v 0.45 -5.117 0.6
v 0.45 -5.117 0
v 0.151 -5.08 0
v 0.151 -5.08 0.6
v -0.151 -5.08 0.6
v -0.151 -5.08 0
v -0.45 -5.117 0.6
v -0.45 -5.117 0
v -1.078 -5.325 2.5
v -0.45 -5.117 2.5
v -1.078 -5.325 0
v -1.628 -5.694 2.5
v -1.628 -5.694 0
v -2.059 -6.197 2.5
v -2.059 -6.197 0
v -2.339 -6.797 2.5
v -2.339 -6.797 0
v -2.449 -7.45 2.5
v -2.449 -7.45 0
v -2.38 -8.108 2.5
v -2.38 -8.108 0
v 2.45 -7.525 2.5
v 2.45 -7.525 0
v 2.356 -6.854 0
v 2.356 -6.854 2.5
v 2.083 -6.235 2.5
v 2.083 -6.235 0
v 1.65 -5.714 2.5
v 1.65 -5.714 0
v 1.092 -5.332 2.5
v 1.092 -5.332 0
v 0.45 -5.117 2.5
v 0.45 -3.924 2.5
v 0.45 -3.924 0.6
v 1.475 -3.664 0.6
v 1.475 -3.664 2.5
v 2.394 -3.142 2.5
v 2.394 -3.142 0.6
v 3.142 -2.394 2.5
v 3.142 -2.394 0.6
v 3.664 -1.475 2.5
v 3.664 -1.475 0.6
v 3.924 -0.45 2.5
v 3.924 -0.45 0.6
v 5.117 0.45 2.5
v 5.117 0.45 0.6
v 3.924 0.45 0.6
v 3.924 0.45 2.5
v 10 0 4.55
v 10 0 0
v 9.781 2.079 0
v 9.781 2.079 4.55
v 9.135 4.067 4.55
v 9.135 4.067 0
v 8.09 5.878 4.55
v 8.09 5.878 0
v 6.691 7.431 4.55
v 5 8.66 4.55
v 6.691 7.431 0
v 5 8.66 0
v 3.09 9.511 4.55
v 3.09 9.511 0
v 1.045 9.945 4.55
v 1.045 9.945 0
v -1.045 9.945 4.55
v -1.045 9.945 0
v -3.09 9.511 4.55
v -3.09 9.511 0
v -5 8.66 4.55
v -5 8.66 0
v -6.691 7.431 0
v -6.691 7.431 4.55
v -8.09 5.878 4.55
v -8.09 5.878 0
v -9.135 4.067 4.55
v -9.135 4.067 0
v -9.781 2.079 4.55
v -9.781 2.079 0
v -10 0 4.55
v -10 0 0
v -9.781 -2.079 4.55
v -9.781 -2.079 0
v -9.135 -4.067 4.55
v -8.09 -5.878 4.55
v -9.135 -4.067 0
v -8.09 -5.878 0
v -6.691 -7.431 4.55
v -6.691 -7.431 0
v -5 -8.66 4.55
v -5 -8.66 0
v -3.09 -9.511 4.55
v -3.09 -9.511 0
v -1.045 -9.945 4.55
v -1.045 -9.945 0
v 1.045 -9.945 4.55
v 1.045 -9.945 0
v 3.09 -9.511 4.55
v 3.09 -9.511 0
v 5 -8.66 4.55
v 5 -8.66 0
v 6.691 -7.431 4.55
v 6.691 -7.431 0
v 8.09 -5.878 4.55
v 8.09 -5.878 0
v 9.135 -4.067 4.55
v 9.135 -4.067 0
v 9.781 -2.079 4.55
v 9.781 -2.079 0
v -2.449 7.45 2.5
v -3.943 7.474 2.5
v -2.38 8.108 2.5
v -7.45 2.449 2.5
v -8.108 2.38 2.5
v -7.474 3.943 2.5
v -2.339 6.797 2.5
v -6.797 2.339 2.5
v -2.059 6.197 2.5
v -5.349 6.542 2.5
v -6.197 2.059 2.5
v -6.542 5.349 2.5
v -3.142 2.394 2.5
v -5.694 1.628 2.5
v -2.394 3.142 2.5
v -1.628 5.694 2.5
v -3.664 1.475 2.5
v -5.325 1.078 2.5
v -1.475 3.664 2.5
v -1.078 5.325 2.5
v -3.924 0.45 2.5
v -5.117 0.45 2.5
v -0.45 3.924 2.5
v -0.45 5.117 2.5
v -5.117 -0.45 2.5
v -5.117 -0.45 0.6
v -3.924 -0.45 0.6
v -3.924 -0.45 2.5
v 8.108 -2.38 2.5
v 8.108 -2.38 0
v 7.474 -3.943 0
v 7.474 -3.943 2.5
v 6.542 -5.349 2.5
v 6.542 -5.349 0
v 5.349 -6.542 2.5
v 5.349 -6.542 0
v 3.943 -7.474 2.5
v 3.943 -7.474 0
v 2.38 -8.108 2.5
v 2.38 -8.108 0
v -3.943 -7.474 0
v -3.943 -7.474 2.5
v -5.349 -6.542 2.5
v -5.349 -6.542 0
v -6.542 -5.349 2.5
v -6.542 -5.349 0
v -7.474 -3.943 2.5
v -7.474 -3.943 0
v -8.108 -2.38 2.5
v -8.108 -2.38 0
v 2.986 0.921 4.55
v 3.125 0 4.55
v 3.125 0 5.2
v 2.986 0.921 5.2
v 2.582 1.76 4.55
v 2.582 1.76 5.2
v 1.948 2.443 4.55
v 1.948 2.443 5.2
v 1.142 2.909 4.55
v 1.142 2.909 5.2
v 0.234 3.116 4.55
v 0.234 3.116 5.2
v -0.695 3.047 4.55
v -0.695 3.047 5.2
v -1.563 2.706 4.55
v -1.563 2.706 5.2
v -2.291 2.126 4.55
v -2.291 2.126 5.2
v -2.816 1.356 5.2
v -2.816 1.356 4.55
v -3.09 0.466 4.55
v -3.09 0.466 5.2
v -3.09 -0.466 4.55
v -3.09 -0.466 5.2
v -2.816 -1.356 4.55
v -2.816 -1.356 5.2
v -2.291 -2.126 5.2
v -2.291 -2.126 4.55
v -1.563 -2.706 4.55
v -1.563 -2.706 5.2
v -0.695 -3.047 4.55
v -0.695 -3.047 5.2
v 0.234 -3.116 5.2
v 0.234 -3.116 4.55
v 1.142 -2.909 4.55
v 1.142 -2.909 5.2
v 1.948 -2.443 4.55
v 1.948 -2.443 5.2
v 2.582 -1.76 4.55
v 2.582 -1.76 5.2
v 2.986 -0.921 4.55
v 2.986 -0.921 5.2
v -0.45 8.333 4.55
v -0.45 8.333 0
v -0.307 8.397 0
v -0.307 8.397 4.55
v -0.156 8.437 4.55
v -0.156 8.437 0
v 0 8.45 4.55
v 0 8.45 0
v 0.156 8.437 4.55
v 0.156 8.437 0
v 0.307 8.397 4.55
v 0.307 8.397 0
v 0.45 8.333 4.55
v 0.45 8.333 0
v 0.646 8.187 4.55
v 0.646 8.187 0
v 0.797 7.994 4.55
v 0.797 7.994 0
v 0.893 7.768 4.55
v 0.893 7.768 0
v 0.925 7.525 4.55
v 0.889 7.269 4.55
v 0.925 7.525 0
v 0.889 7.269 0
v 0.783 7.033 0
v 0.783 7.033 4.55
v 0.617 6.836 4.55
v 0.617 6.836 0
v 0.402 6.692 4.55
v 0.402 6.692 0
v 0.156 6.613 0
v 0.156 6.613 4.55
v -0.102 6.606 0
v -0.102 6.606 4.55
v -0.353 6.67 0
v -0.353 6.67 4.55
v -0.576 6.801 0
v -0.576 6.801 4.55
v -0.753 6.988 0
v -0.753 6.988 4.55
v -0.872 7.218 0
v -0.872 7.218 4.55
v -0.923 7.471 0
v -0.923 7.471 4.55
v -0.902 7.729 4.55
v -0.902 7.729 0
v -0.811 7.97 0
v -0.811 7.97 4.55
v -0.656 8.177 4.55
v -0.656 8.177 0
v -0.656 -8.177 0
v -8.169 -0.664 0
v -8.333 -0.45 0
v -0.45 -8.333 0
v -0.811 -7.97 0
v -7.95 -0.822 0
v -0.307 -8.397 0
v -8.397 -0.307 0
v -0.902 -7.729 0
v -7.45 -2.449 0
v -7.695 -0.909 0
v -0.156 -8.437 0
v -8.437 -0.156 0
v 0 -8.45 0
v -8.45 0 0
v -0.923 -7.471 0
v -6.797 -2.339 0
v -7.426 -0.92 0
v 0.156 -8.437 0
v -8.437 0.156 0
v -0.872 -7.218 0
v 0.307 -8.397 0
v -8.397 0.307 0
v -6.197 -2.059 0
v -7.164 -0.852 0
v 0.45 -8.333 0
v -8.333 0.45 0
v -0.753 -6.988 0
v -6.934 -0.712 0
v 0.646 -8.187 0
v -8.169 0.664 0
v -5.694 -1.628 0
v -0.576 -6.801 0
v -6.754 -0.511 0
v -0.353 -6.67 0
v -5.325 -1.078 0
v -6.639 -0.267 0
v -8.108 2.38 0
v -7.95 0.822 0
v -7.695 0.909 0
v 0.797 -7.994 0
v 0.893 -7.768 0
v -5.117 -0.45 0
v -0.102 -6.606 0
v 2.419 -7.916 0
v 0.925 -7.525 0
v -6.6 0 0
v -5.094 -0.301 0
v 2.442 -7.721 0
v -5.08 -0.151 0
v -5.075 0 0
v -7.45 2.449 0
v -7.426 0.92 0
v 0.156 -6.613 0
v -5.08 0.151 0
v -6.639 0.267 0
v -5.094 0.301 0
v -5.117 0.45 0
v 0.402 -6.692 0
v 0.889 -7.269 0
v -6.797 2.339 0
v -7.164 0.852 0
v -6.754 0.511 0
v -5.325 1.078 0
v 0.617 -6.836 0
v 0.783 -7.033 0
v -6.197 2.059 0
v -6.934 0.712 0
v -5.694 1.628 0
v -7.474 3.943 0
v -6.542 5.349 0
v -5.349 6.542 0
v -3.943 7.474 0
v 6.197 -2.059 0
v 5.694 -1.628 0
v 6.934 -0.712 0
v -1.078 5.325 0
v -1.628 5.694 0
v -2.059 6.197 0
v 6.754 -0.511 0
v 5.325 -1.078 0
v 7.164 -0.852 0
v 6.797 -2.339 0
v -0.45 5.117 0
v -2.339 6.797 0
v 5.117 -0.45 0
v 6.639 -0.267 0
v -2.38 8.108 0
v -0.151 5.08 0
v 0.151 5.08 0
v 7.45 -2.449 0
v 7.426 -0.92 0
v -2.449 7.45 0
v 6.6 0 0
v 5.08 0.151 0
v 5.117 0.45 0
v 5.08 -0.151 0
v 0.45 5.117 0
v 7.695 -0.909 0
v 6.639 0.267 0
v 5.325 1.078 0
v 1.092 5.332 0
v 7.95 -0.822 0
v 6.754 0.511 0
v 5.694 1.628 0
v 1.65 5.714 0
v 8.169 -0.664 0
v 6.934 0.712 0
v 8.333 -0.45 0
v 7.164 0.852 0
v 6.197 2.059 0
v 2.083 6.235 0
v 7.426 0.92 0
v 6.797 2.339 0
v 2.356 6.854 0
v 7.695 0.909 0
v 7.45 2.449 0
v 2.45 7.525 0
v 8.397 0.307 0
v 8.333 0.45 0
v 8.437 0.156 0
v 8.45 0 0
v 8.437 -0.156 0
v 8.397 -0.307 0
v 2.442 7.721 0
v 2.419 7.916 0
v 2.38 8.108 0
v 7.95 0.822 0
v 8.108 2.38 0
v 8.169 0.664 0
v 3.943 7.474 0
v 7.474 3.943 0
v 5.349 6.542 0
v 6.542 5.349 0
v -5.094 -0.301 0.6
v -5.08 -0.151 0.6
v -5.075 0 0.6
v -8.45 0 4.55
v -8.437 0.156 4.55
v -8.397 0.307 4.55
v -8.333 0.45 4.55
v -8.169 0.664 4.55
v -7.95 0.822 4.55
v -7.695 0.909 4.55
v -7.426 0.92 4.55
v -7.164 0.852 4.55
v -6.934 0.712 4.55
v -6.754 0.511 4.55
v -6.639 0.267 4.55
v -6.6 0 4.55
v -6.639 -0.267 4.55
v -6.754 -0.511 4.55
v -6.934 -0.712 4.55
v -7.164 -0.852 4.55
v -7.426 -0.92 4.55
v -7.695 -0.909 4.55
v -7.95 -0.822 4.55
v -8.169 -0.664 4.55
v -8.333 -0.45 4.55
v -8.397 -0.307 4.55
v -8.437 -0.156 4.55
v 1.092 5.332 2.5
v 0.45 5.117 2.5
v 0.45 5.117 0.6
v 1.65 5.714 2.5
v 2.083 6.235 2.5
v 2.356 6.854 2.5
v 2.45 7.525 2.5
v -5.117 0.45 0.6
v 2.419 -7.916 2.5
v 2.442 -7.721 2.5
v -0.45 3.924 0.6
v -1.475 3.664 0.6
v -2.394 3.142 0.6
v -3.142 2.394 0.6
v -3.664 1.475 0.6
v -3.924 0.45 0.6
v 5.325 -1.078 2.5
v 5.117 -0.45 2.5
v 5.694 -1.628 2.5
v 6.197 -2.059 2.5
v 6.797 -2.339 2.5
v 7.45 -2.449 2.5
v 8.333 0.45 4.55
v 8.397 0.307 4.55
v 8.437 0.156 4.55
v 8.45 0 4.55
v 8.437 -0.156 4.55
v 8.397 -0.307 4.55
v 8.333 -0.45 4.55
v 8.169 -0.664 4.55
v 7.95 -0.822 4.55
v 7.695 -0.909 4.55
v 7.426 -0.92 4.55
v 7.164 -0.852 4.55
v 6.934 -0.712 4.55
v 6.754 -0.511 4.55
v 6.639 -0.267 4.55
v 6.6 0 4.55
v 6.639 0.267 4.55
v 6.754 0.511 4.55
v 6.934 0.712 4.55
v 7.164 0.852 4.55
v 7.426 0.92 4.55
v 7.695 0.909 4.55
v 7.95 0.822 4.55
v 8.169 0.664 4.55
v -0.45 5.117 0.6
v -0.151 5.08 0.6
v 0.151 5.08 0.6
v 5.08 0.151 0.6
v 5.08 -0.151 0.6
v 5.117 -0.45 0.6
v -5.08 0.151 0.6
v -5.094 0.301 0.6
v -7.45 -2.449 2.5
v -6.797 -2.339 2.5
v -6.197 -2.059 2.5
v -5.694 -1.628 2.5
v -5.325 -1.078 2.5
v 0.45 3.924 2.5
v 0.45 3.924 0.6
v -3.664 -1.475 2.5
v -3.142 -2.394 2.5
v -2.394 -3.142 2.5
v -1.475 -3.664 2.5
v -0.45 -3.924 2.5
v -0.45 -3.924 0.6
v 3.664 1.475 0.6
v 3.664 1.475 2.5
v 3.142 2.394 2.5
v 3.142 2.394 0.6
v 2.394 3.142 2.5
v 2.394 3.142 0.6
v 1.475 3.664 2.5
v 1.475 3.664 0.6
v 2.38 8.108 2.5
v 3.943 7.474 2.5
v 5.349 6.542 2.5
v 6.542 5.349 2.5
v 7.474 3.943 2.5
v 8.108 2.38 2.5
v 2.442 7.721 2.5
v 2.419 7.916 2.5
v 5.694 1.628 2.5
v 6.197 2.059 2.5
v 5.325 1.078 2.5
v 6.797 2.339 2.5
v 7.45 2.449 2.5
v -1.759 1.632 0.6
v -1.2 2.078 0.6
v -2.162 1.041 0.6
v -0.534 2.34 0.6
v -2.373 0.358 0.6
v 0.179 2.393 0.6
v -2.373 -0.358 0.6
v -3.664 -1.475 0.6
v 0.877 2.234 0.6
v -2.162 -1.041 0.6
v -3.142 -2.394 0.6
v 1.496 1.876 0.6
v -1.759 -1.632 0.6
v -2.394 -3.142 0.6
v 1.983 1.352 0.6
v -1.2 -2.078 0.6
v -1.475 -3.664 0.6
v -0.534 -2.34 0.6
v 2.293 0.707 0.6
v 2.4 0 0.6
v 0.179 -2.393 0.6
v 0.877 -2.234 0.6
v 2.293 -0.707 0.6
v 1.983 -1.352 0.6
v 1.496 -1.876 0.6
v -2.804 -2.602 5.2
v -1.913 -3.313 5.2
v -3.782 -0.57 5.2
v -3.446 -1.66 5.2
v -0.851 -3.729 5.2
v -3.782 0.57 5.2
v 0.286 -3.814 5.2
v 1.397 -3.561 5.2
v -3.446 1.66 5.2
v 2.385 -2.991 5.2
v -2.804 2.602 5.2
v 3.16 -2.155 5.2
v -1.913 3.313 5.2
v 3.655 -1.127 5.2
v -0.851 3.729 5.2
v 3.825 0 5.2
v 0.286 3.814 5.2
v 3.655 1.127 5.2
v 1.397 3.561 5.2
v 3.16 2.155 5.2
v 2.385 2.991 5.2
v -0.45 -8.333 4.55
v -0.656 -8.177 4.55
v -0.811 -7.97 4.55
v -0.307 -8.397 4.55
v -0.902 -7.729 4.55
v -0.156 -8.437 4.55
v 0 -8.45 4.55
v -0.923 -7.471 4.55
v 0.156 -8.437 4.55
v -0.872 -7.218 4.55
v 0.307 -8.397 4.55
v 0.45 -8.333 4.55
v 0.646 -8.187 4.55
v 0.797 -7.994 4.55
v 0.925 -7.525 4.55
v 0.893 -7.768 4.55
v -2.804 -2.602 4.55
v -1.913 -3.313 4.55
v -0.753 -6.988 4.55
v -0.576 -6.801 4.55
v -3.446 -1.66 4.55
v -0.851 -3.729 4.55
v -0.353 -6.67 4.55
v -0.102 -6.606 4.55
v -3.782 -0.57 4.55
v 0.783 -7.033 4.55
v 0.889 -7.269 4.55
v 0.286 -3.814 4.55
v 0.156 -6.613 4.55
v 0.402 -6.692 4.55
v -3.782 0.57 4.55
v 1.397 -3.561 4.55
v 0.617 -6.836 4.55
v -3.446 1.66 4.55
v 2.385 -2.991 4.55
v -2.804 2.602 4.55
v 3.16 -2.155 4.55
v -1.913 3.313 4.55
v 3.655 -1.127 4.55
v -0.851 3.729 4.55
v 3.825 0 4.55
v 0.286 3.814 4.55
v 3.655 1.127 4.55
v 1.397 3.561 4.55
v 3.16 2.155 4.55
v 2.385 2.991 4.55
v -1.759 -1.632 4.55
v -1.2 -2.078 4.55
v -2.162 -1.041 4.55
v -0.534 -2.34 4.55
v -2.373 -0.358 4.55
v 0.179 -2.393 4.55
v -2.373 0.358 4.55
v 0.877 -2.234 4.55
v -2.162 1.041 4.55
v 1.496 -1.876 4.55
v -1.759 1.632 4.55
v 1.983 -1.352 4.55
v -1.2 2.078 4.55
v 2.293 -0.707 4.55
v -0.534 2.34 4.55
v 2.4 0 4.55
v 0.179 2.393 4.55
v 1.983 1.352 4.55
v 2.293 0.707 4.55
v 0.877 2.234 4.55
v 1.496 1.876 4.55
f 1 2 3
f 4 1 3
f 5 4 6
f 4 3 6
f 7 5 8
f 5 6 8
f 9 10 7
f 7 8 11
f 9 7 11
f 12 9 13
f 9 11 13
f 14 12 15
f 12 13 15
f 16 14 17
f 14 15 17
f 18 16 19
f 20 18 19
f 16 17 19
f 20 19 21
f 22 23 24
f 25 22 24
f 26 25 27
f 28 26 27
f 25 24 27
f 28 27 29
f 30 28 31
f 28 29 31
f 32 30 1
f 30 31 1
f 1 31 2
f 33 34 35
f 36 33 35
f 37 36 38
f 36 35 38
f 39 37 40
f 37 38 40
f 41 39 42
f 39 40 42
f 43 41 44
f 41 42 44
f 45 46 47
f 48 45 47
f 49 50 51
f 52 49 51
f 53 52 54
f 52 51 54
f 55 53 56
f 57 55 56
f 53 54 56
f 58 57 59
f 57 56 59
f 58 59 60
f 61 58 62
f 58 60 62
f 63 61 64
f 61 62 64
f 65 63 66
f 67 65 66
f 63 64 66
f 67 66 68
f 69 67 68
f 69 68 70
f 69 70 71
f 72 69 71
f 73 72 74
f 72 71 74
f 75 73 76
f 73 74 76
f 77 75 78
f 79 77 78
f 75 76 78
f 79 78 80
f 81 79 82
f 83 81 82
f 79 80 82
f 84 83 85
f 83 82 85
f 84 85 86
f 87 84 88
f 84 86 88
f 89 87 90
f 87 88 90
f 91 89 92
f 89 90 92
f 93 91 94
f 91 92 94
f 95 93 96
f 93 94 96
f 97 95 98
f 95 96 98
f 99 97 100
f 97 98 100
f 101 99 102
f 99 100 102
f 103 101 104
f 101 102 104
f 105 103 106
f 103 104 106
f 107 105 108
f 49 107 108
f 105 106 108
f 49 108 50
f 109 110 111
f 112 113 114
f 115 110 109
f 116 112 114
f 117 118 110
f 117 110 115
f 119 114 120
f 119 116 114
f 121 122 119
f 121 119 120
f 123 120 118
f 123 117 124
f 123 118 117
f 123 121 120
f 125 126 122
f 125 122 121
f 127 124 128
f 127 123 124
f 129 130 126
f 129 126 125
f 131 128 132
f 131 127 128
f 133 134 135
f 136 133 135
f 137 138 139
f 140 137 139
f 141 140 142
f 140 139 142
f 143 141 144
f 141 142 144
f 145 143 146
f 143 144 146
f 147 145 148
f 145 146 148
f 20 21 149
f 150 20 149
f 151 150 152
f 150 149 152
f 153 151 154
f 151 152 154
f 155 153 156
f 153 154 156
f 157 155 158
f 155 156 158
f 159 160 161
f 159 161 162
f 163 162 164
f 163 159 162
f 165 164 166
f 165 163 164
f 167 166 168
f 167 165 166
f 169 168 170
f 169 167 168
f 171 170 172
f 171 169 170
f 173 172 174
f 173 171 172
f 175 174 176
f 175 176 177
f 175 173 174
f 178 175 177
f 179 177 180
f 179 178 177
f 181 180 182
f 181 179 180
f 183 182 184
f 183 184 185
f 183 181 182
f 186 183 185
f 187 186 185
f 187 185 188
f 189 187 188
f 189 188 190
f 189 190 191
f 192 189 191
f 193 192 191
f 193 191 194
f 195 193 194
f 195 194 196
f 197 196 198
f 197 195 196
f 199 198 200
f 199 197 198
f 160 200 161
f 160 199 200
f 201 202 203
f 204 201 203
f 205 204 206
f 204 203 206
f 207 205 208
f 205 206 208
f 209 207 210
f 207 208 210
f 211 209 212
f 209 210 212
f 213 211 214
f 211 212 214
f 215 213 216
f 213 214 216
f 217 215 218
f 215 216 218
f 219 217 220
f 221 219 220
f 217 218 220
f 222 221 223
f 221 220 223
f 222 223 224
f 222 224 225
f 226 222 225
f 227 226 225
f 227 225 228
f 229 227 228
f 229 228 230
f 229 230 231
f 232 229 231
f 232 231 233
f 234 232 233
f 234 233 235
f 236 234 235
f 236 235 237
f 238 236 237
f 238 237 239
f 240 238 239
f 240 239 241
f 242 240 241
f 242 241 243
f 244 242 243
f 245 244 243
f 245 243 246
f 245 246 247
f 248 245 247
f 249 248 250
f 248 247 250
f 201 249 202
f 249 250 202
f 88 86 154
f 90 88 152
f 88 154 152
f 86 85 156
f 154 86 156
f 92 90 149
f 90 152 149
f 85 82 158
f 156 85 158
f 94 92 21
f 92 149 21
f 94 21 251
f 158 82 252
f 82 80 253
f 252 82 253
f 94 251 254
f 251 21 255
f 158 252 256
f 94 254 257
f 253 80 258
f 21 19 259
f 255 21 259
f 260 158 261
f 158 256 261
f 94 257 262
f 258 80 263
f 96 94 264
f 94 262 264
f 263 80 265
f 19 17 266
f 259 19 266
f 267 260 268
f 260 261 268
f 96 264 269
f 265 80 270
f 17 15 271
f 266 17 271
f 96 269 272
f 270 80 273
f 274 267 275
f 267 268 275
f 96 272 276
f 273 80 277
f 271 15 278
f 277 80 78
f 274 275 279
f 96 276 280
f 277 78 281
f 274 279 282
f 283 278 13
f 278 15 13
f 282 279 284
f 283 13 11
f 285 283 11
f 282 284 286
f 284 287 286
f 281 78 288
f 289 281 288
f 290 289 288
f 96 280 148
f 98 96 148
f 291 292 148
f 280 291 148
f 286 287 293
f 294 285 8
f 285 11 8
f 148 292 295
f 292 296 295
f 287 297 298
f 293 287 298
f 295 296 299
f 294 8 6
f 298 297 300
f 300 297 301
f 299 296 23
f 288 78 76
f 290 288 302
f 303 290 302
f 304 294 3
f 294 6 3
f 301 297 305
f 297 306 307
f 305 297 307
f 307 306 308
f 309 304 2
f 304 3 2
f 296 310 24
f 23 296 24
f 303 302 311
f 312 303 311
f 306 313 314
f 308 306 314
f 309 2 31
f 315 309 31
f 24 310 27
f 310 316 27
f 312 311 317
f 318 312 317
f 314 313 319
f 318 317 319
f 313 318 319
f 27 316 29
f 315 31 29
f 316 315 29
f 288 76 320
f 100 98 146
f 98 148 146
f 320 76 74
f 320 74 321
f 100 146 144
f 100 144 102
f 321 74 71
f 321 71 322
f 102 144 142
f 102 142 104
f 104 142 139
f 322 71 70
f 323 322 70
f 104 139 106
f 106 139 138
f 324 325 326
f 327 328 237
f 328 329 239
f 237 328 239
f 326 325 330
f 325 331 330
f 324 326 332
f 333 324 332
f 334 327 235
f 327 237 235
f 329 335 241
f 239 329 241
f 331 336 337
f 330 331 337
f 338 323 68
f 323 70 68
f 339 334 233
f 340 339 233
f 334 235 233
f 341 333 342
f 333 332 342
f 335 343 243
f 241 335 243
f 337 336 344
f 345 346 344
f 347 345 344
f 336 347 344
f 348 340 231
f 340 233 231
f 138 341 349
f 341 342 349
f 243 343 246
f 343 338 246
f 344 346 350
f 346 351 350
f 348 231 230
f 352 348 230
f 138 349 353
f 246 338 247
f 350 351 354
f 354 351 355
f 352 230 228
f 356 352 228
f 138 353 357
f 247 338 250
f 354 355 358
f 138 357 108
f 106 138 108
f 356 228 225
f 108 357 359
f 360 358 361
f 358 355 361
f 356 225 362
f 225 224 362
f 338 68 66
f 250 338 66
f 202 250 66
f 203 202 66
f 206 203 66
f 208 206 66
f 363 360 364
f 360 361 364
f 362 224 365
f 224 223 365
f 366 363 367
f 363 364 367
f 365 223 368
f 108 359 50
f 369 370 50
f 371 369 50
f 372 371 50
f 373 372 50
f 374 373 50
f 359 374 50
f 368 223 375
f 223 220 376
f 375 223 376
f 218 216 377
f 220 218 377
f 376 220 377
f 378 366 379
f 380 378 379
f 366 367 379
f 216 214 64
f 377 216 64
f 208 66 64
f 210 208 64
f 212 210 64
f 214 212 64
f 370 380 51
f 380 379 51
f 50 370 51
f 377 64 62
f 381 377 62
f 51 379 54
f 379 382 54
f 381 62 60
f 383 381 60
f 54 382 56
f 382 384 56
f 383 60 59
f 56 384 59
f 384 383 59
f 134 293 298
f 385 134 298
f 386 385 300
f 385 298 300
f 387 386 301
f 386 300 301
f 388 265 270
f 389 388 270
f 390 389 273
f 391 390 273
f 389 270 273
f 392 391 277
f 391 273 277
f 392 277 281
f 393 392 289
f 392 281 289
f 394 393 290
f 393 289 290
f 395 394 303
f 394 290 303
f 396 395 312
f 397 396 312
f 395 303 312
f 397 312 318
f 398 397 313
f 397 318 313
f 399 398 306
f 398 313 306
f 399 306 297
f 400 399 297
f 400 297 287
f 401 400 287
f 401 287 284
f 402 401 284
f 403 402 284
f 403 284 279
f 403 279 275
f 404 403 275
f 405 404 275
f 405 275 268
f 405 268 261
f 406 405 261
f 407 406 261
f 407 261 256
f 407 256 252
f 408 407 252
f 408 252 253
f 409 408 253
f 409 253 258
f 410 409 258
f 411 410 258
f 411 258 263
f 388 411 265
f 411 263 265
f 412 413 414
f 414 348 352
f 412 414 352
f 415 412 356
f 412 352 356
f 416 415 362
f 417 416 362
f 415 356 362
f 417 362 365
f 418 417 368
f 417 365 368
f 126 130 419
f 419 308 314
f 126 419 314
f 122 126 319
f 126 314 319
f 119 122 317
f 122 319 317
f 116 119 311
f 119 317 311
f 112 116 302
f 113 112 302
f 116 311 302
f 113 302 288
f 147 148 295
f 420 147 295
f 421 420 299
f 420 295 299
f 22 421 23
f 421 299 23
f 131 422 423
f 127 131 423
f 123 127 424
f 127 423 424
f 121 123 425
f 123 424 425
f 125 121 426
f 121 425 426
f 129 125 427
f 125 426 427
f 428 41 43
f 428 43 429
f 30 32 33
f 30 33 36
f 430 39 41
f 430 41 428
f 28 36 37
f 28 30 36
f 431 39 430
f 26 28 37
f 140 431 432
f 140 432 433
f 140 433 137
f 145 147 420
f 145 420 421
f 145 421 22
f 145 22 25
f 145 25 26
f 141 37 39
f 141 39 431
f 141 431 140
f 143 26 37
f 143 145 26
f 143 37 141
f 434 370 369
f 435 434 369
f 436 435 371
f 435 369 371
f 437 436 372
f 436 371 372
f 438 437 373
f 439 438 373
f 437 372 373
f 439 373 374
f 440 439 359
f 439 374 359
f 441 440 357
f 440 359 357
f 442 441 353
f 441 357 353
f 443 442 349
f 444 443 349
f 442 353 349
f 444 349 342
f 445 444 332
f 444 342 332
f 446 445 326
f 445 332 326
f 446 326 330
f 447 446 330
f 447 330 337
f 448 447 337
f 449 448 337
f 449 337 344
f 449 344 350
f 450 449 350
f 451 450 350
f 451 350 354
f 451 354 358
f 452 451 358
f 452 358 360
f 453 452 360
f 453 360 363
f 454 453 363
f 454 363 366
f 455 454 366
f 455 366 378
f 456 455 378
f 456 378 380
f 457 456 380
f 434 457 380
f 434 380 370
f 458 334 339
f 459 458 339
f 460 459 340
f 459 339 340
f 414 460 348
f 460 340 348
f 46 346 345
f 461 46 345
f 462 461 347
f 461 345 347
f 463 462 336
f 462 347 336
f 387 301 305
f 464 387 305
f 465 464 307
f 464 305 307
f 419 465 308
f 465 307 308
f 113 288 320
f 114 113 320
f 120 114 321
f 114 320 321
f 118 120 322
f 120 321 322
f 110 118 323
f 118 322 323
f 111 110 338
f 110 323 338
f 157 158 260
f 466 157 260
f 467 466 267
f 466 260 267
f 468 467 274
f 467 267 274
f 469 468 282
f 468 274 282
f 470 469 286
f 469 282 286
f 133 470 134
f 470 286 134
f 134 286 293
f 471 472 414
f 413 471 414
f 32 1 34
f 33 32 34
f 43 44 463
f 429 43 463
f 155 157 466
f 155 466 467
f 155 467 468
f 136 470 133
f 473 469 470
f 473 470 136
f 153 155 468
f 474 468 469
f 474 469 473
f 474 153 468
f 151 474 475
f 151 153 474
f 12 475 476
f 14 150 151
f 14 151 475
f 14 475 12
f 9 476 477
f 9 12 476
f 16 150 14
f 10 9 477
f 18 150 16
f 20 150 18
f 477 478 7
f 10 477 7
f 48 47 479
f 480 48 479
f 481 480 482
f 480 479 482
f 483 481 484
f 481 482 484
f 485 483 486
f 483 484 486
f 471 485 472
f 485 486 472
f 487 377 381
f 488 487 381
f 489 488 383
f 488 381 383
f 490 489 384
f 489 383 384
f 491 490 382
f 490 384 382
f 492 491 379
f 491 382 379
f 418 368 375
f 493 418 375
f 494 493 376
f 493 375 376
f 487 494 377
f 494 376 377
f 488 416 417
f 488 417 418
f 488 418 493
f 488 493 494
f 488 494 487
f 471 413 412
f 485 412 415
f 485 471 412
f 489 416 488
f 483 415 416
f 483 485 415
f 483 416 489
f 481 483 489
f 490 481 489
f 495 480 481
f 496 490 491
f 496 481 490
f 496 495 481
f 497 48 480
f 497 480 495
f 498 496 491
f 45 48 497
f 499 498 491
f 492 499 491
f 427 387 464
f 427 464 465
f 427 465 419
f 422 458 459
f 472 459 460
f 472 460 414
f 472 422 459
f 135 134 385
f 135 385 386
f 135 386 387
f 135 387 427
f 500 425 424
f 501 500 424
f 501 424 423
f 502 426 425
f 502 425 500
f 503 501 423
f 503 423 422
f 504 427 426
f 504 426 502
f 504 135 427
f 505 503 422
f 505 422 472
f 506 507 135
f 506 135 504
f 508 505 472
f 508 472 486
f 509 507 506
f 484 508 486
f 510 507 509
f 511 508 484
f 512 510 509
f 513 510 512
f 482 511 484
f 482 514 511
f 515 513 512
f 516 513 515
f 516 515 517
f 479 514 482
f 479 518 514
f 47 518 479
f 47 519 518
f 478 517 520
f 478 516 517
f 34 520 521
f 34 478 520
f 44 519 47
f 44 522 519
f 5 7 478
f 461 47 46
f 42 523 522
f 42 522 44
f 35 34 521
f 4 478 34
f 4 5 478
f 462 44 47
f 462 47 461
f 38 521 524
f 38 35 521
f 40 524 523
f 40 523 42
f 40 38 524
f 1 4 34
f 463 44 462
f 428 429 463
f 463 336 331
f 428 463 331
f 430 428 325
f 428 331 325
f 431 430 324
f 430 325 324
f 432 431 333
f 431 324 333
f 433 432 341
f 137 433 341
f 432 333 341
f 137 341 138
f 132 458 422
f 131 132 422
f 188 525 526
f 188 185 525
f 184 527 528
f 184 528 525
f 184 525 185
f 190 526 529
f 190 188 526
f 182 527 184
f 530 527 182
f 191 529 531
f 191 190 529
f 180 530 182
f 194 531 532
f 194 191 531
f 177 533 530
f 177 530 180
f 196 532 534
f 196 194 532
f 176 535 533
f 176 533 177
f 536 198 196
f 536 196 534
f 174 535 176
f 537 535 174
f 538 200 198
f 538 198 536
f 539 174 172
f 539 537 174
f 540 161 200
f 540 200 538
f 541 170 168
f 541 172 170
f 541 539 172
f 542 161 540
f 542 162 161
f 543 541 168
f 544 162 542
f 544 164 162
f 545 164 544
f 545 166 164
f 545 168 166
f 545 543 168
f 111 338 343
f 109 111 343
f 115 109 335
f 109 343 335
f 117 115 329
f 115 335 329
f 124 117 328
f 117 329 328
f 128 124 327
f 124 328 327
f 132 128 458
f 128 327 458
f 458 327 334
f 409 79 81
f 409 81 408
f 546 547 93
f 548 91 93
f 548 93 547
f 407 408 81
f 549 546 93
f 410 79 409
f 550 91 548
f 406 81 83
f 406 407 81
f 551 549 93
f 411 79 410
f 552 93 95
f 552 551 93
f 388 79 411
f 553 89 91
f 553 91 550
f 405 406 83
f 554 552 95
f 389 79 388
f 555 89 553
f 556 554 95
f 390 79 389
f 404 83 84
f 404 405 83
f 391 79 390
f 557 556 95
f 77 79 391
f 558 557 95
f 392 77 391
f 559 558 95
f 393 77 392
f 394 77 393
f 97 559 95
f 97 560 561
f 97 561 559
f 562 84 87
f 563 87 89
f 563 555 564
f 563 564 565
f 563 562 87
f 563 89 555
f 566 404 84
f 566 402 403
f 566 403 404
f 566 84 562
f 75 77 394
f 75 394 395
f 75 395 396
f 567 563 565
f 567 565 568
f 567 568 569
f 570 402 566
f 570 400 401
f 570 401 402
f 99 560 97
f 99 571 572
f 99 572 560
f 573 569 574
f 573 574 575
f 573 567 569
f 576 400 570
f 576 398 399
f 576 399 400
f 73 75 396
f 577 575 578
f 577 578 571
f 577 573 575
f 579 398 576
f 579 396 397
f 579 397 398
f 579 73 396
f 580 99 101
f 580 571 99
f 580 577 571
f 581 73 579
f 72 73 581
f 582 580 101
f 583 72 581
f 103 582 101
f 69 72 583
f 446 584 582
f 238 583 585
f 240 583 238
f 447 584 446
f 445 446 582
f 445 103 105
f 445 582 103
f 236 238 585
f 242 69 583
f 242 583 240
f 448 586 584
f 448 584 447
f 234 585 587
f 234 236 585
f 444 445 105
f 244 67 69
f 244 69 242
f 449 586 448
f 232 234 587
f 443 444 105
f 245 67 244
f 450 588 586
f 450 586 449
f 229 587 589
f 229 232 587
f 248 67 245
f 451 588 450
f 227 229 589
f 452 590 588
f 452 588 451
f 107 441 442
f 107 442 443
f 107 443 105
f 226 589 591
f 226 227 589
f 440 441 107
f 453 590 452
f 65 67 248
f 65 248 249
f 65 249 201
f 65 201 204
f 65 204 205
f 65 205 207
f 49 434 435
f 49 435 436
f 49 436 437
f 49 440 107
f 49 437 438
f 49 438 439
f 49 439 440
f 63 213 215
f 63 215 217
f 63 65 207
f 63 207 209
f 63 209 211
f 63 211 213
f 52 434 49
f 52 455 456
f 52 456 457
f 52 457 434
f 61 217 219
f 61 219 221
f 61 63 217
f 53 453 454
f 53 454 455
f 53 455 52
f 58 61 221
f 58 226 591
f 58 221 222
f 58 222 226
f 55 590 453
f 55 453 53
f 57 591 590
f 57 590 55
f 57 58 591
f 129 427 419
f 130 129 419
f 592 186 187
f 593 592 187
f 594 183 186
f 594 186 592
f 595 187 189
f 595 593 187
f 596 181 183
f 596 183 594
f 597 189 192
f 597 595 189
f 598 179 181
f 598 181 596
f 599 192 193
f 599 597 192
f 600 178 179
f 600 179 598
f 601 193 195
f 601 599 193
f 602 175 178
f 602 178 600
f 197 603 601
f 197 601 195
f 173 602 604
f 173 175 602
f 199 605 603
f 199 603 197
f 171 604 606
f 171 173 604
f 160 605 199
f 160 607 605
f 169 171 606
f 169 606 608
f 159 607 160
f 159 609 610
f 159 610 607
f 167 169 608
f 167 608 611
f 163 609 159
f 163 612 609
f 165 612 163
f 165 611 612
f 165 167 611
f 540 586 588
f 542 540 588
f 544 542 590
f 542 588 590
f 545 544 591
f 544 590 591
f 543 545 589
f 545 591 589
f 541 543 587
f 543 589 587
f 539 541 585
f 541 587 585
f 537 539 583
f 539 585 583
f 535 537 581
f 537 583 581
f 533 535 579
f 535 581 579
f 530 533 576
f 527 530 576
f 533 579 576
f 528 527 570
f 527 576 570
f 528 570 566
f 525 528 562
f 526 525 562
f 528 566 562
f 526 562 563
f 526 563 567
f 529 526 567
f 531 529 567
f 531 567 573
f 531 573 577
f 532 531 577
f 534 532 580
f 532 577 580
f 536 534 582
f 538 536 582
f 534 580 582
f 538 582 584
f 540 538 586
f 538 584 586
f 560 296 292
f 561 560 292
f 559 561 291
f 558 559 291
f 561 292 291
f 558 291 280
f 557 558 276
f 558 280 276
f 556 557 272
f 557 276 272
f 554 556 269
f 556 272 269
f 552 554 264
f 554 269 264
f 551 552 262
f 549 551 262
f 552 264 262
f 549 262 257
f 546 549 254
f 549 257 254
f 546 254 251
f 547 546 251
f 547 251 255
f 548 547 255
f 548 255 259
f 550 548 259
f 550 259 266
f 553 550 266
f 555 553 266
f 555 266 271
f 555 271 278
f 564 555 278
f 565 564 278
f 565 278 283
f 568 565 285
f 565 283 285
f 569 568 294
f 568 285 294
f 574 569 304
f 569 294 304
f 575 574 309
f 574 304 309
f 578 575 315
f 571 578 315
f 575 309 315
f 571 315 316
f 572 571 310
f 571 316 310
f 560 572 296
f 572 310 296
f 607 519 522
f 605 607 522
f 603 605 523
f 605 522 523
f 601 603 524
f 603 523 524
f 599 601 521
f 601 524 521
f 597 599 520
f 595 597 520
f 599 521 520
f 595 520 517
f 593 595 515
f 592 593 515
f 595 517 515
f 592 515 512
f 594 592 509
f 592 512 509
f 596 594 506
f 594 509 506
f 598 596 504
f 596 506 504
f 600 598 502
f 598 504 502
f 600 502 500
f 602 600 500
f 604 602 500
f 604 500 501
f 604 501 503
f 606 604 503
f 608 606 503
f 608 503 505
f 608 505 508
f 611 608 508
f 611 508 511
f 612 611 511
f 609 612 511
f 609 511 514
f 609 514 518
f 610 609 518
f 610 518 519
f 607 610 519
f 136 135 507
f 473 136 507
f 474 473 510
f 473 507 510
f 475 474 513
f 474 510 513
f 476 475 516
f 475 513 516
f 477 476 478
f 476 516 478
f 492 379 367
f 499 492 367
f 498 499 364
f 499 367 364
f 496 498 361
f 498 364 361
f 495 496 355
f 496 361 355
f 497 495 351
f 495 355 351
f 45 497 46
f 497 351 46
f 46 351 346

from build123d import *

# Parameters (mm, degrees)
F0_R     = 10
F1_DEPTH = 4.55
F2_R     = 2.4
F3_DEPTH = 2.5
F4_DEPTH = 25
F5_DEPTH = 0.6
F6_R     = 3.825
F6_R_2   = 3.125
F7_DEPTH = 0.65


with BuildPart() as f1:
    # F0 (on Top) → F1 (new body)
    with BuildSketch(Plane.XY):
        Circle(F0_R)
    extrude(amount=F1_DEPTH)

    # F2 (on face) → F3 (cut)
    with BuildSketch(Plane(origin=(0, 0, 0), x_dir=(1, 0, 0), z_dir=(0, 0, -1))):
        with BuildLine():
            ThreePointArc((5.1166810842, 0.45), (6.1969215277, 2.0588121749), (8.1080149502, 2.3796204672))
            ThreePointArc((8.1080149502, 2.3796204672), (5.975052301, 5.975052301), (2.3796204672, 8.1080149502))
            ThreePointArc((2.3796204672, 8.1080149502), (2.4323414794, 7.818623786), (2.45, 7.525))
            ThreePointArc((2.45, 7.525), (1.8848076825, 5.9597524158), (0.45, 5.1166810842))
            Line((0.45, 5.1166810842), (0.45, 3.9242833741))
            ThreePointArc((0.45, 3.9242833741), (2.7930717857, 2.7930717857), (3.9242833741, 0.45))
            Line((3.9242833741, 0.45), (5.1166810842, 0.45))
        make_face()
        with BuildLine():
            ThreePointArc((-0.45, 5.1166810842), (-2.0588121749, 6.1969215277), (-2.3796204672, 8.1080149502))
            ThreePointArc((-2.3796204672, 8.1080149502), (-5.975052301, 5.975052301), (-8.1080149502, 2.3796204672))
            ThreePointArc((-8.1080149502, 2.3796204672), (-6.1969215277, 2.0588121749), (-5.1166810842, 0.45))
            Line((-5.1166810842, 0.45), (-3.9242833741, 0.45))
            ThreePointArc((-3.9242833741, 0.45), (-2.7930717857, 2.7930717857), (-0.45, 3.9242833741))
            Line((-0.45, 3.9242833741), (-0.45, 5.1166810842))
        make_face()
        with BuildLine():
            ThreePointArc((-8.1080149502, -2.3796204672), (-5.975052301, -5.975052301), (-2.3796204672, -8.1080149502))
            ThreePointArc((-2.3796204672, -8.1080149502), (-2.0588121749, -6.1969215277), (-0.45, -5.1166810842))
            Line((-0.45, -5.1166810842), (-0.45, -3.9242833741))
            ThreePointArc((-0.45, -3.9242833741), (-2.7930717857, -2.7930717857), (-3.9242833741, -0.45))
            Line((-3.9242833741, -0.45), (-5.1166810842, -0.45))
            ThreePointArc((-5.1166810842, -0.45), (-6.1969215277, -2.0588121749), (-8.1080149502, -2.3796204672))
        make_face()
        with BuildLine():
            ThreePointArc((2.3796204672, -8.1080149502), (5.975052301, -5.975052301), (8.1080149502, -2.3796204672))
            ThreePointArc((8.1080149502, -2.3796204672), (6.1969215277, -2.0588121749), (5.1166810842, -0.45))
            Line((5.1166810842, -0.45), (3.9242833741, -0.45))
            ThreePointArc((3.9242833741, -0.45), (2.7930717857, -2.7930717857), (0.45, -3.9242833741))
            Line((0.45, -3.9242833741), (0.45, -5.1166810842))
            ThreePointArc((0.45, -5.1166810842), (1.8848076825, -5.9597524158), (2.45, -7.525))
            ThreePointArc((2.45, -7.525), (2.4323414794, -7.818623786), (2.3796204672, -8.1080149502))
        make_face()
        with BuildLine():
            ThreePointArc((8.3331614938, -0.45), (8.420314018, -0.2324603388), (8.45, 0))
            ThreePointArc((8.45, 0), (8.420314018, 0.2324603388), (8.3331614938, 0.45))
            ThreePointArc((8.3331614938, 0.45), (6.6, 0), (8.3331614938, -0.45))
        make_face()
        with BuildLine():
            ThreePointArc((-8.3331614938, 0.45), (-8.4203140187, 0.2324603363), (-8.45, -5.3e-09))
            ThreePointArc((-8.45, -5.3e-09), (-8.4203140174, -0.2324603414), (-8.3331614938, -0.45))
            ThreePointArc((-8.3331614938, -0.45), (-7.2925396612, -0.895314018), (-6.6, 0))
            ThreePointArc((-6.6, 0), (-7.2925396612, 0.895314018), (-8.3331614938, 0.45))
        make_face()
        with BuildLine():
            ThreePointArc((0.45, 8.3331614938), (0.2324603388, 8.420314018), (0, 8.45))
            ThreePointArc((0, 8.45), (-0.2324603388, 8.420314018), (-0.45, 8.3331614938))
            ThreePointArc((-0.45, 8.3331614938), (-0.4687083315, 6.7275431046), (0.925, 7.525))
            ThreePointArc((0.925, 7.525), (0.7974568954, 7.9937083315), (0.45, 8.3331614938))
        make_face()
        with BuildLine():
            ThreePointArc((-0.45, -8.3331614938), (-0.2324603347, -8.4203140191), (8.6e-09, -8.45))
            ThreePointArc((8.6e-09, -8.45), (0.232460343, -8.4203140169), (0.45, -8.3331614938))
            ThreePointArc((0.45, -8.3331614938), (0.7974568954, -7.9937083315), (0.925, -7.525))
            ThreePointArc((0.925, -7.525), (-0.4687083315, -6.7275431046), (-0.45, -8.3331614938))
        make_face()
        Circle(F2_R)
    extrude(amount=-F3_DEPTH, mode=Mode.SUBTRACT)

    # F4 (cut): faces of the model
    f4_faces = [f1.faces().sort_by_distance(p)[0] for p in [
        (7.525, 0, 2.5),
        (-7.525, 0, 2.5),
        (0, -7.525, 2.5),
        (0, 0, 2.5),
        (0, 7.525, 2.5),
    ]]
    extrude(f4_faces, amount=-F4_DEPTH, mode=Mode.SUBTRACT)

    # F2 (on face) → F5 (cut)
    with BuildSketch(Plane(origin=(0, 0, 0), x_dir=(1, 0, 0), z_dir=(0, 0, -1))):
        with BuildLine():
            ThreePointArc((3.95, 0), (3.9435656028, 0.2253671143), (3.9242833741, 0.45))
            ThreePointArc((3.9242833741, 0.45), (2.7930717857, 2.7930717857), (0.45, 3.9242833741))
            ThreePointArc((0.45, 3.9242833741), (0, 3.95), (-0.45, 3.9242833741))
            ThreePointArc((-0.45, 3.9242833741), (-2.7930717857, 2.7930717857), (-3.9242833741, 0.45))
            ThreePointArc((-3.9242833741, 0.45), (-3.95, 0), (-3.9242833741, -0.45))
            ThreePointArc((-3.9242833741, -0.45), (-2.7930717857, -2.7930717857), (-0.45, -3.9242833741))
            ThreePointArc((-0.45, -3.9242833741), (0, -3.95), (0.45, -3.9242833741))
            ThreePointArc((0.45, -3.9242833741), (2.7930717857, -2.7930717857), (3.9242833741, -0.45))
            ThreePointArc((3.9242833741, -0.45), (3.9435656028, -0.2253671143), (3.95, 0))
        make_face()
        Circle(F2_R, mode=Mode.SUBTRACT)
        with BuildLine():
            Line((0.45, 3.9242833741), (0.45, 5.1166810842))
            ThreePointArc((0.45, 5.1166810842), (0, 5.075), (-0.45, 5.1166810842))
            Line((-0.45, 5.1166810842), (-0.45, 3.9242833741))
            ThreePointArc((-0.45, 3.9242833741), (0, 3.95), (0.45, 3.9242833741))
        make_face()
        with BuildLine():
            ThreePointArc((5.1166810842, -0.45), (5.075, 0), (5.1166810842, 0.45))
            Line((5.1166810842, 0.45), (3.9242833741, 0.45))
            ThreePointArc((3.9242833741, 0.45), (3.9435656028, 0.2253671143), (3.95, 0))
            ThreePointArc((3.95, 0), (3.9435656028, -0.2253671143), (3.9242833741, -0.45))
            Line((3.9242833741, -0.45), (5.1166810842, -0.45))
        make_face()
        with BuildLine():
            Line((-0.45, -3.9242833741), (-0.45, -5.1166810842))
            ThreePointArc((-0.45, -5.1166810842), (0, -5.075), (0.45, -5.1166810842))
            Line((0.45, -5.1166810842), (0.45, -3.9242833741))
            ThreePointArc((0.45, -3.9242833741), (0, -3.95), (-0.45, -3.9242833741))
        make_face()
        with BuildLine():
            Line((-3.9242833741, 0.45), (-5.1166810842, 0.45))
            ThreePointArc((-5.1166810842, 0.45), (-5.0854425254, 0.2259631125), (-5.075, 0))
            ThreePointArc((-5.075, 0), (-5.0854425254, -0.2259631125), (-5.1166810842, -0.45))
            Line((-5.1166810842, -0.45), (-3.9242833741, -0.45))
            ThreePointArc((-3.9242833741, -0.45), (-3.95, 0), (-3.9242833741, 0.45))
        make_face()
    extrude(amount=-F5_DEPTH, mode=Mode.SUBTRACT)

    # F6 (on face) → F7 (join)
    with BuildSketch(Plane.XY.offset(4.55)):
        Circle(F6_R)
        Circle(F6_R_2, mode=Mode.SUBTRACT)
    extrude(amount=F7_DEPTH)


solid = f1.part
